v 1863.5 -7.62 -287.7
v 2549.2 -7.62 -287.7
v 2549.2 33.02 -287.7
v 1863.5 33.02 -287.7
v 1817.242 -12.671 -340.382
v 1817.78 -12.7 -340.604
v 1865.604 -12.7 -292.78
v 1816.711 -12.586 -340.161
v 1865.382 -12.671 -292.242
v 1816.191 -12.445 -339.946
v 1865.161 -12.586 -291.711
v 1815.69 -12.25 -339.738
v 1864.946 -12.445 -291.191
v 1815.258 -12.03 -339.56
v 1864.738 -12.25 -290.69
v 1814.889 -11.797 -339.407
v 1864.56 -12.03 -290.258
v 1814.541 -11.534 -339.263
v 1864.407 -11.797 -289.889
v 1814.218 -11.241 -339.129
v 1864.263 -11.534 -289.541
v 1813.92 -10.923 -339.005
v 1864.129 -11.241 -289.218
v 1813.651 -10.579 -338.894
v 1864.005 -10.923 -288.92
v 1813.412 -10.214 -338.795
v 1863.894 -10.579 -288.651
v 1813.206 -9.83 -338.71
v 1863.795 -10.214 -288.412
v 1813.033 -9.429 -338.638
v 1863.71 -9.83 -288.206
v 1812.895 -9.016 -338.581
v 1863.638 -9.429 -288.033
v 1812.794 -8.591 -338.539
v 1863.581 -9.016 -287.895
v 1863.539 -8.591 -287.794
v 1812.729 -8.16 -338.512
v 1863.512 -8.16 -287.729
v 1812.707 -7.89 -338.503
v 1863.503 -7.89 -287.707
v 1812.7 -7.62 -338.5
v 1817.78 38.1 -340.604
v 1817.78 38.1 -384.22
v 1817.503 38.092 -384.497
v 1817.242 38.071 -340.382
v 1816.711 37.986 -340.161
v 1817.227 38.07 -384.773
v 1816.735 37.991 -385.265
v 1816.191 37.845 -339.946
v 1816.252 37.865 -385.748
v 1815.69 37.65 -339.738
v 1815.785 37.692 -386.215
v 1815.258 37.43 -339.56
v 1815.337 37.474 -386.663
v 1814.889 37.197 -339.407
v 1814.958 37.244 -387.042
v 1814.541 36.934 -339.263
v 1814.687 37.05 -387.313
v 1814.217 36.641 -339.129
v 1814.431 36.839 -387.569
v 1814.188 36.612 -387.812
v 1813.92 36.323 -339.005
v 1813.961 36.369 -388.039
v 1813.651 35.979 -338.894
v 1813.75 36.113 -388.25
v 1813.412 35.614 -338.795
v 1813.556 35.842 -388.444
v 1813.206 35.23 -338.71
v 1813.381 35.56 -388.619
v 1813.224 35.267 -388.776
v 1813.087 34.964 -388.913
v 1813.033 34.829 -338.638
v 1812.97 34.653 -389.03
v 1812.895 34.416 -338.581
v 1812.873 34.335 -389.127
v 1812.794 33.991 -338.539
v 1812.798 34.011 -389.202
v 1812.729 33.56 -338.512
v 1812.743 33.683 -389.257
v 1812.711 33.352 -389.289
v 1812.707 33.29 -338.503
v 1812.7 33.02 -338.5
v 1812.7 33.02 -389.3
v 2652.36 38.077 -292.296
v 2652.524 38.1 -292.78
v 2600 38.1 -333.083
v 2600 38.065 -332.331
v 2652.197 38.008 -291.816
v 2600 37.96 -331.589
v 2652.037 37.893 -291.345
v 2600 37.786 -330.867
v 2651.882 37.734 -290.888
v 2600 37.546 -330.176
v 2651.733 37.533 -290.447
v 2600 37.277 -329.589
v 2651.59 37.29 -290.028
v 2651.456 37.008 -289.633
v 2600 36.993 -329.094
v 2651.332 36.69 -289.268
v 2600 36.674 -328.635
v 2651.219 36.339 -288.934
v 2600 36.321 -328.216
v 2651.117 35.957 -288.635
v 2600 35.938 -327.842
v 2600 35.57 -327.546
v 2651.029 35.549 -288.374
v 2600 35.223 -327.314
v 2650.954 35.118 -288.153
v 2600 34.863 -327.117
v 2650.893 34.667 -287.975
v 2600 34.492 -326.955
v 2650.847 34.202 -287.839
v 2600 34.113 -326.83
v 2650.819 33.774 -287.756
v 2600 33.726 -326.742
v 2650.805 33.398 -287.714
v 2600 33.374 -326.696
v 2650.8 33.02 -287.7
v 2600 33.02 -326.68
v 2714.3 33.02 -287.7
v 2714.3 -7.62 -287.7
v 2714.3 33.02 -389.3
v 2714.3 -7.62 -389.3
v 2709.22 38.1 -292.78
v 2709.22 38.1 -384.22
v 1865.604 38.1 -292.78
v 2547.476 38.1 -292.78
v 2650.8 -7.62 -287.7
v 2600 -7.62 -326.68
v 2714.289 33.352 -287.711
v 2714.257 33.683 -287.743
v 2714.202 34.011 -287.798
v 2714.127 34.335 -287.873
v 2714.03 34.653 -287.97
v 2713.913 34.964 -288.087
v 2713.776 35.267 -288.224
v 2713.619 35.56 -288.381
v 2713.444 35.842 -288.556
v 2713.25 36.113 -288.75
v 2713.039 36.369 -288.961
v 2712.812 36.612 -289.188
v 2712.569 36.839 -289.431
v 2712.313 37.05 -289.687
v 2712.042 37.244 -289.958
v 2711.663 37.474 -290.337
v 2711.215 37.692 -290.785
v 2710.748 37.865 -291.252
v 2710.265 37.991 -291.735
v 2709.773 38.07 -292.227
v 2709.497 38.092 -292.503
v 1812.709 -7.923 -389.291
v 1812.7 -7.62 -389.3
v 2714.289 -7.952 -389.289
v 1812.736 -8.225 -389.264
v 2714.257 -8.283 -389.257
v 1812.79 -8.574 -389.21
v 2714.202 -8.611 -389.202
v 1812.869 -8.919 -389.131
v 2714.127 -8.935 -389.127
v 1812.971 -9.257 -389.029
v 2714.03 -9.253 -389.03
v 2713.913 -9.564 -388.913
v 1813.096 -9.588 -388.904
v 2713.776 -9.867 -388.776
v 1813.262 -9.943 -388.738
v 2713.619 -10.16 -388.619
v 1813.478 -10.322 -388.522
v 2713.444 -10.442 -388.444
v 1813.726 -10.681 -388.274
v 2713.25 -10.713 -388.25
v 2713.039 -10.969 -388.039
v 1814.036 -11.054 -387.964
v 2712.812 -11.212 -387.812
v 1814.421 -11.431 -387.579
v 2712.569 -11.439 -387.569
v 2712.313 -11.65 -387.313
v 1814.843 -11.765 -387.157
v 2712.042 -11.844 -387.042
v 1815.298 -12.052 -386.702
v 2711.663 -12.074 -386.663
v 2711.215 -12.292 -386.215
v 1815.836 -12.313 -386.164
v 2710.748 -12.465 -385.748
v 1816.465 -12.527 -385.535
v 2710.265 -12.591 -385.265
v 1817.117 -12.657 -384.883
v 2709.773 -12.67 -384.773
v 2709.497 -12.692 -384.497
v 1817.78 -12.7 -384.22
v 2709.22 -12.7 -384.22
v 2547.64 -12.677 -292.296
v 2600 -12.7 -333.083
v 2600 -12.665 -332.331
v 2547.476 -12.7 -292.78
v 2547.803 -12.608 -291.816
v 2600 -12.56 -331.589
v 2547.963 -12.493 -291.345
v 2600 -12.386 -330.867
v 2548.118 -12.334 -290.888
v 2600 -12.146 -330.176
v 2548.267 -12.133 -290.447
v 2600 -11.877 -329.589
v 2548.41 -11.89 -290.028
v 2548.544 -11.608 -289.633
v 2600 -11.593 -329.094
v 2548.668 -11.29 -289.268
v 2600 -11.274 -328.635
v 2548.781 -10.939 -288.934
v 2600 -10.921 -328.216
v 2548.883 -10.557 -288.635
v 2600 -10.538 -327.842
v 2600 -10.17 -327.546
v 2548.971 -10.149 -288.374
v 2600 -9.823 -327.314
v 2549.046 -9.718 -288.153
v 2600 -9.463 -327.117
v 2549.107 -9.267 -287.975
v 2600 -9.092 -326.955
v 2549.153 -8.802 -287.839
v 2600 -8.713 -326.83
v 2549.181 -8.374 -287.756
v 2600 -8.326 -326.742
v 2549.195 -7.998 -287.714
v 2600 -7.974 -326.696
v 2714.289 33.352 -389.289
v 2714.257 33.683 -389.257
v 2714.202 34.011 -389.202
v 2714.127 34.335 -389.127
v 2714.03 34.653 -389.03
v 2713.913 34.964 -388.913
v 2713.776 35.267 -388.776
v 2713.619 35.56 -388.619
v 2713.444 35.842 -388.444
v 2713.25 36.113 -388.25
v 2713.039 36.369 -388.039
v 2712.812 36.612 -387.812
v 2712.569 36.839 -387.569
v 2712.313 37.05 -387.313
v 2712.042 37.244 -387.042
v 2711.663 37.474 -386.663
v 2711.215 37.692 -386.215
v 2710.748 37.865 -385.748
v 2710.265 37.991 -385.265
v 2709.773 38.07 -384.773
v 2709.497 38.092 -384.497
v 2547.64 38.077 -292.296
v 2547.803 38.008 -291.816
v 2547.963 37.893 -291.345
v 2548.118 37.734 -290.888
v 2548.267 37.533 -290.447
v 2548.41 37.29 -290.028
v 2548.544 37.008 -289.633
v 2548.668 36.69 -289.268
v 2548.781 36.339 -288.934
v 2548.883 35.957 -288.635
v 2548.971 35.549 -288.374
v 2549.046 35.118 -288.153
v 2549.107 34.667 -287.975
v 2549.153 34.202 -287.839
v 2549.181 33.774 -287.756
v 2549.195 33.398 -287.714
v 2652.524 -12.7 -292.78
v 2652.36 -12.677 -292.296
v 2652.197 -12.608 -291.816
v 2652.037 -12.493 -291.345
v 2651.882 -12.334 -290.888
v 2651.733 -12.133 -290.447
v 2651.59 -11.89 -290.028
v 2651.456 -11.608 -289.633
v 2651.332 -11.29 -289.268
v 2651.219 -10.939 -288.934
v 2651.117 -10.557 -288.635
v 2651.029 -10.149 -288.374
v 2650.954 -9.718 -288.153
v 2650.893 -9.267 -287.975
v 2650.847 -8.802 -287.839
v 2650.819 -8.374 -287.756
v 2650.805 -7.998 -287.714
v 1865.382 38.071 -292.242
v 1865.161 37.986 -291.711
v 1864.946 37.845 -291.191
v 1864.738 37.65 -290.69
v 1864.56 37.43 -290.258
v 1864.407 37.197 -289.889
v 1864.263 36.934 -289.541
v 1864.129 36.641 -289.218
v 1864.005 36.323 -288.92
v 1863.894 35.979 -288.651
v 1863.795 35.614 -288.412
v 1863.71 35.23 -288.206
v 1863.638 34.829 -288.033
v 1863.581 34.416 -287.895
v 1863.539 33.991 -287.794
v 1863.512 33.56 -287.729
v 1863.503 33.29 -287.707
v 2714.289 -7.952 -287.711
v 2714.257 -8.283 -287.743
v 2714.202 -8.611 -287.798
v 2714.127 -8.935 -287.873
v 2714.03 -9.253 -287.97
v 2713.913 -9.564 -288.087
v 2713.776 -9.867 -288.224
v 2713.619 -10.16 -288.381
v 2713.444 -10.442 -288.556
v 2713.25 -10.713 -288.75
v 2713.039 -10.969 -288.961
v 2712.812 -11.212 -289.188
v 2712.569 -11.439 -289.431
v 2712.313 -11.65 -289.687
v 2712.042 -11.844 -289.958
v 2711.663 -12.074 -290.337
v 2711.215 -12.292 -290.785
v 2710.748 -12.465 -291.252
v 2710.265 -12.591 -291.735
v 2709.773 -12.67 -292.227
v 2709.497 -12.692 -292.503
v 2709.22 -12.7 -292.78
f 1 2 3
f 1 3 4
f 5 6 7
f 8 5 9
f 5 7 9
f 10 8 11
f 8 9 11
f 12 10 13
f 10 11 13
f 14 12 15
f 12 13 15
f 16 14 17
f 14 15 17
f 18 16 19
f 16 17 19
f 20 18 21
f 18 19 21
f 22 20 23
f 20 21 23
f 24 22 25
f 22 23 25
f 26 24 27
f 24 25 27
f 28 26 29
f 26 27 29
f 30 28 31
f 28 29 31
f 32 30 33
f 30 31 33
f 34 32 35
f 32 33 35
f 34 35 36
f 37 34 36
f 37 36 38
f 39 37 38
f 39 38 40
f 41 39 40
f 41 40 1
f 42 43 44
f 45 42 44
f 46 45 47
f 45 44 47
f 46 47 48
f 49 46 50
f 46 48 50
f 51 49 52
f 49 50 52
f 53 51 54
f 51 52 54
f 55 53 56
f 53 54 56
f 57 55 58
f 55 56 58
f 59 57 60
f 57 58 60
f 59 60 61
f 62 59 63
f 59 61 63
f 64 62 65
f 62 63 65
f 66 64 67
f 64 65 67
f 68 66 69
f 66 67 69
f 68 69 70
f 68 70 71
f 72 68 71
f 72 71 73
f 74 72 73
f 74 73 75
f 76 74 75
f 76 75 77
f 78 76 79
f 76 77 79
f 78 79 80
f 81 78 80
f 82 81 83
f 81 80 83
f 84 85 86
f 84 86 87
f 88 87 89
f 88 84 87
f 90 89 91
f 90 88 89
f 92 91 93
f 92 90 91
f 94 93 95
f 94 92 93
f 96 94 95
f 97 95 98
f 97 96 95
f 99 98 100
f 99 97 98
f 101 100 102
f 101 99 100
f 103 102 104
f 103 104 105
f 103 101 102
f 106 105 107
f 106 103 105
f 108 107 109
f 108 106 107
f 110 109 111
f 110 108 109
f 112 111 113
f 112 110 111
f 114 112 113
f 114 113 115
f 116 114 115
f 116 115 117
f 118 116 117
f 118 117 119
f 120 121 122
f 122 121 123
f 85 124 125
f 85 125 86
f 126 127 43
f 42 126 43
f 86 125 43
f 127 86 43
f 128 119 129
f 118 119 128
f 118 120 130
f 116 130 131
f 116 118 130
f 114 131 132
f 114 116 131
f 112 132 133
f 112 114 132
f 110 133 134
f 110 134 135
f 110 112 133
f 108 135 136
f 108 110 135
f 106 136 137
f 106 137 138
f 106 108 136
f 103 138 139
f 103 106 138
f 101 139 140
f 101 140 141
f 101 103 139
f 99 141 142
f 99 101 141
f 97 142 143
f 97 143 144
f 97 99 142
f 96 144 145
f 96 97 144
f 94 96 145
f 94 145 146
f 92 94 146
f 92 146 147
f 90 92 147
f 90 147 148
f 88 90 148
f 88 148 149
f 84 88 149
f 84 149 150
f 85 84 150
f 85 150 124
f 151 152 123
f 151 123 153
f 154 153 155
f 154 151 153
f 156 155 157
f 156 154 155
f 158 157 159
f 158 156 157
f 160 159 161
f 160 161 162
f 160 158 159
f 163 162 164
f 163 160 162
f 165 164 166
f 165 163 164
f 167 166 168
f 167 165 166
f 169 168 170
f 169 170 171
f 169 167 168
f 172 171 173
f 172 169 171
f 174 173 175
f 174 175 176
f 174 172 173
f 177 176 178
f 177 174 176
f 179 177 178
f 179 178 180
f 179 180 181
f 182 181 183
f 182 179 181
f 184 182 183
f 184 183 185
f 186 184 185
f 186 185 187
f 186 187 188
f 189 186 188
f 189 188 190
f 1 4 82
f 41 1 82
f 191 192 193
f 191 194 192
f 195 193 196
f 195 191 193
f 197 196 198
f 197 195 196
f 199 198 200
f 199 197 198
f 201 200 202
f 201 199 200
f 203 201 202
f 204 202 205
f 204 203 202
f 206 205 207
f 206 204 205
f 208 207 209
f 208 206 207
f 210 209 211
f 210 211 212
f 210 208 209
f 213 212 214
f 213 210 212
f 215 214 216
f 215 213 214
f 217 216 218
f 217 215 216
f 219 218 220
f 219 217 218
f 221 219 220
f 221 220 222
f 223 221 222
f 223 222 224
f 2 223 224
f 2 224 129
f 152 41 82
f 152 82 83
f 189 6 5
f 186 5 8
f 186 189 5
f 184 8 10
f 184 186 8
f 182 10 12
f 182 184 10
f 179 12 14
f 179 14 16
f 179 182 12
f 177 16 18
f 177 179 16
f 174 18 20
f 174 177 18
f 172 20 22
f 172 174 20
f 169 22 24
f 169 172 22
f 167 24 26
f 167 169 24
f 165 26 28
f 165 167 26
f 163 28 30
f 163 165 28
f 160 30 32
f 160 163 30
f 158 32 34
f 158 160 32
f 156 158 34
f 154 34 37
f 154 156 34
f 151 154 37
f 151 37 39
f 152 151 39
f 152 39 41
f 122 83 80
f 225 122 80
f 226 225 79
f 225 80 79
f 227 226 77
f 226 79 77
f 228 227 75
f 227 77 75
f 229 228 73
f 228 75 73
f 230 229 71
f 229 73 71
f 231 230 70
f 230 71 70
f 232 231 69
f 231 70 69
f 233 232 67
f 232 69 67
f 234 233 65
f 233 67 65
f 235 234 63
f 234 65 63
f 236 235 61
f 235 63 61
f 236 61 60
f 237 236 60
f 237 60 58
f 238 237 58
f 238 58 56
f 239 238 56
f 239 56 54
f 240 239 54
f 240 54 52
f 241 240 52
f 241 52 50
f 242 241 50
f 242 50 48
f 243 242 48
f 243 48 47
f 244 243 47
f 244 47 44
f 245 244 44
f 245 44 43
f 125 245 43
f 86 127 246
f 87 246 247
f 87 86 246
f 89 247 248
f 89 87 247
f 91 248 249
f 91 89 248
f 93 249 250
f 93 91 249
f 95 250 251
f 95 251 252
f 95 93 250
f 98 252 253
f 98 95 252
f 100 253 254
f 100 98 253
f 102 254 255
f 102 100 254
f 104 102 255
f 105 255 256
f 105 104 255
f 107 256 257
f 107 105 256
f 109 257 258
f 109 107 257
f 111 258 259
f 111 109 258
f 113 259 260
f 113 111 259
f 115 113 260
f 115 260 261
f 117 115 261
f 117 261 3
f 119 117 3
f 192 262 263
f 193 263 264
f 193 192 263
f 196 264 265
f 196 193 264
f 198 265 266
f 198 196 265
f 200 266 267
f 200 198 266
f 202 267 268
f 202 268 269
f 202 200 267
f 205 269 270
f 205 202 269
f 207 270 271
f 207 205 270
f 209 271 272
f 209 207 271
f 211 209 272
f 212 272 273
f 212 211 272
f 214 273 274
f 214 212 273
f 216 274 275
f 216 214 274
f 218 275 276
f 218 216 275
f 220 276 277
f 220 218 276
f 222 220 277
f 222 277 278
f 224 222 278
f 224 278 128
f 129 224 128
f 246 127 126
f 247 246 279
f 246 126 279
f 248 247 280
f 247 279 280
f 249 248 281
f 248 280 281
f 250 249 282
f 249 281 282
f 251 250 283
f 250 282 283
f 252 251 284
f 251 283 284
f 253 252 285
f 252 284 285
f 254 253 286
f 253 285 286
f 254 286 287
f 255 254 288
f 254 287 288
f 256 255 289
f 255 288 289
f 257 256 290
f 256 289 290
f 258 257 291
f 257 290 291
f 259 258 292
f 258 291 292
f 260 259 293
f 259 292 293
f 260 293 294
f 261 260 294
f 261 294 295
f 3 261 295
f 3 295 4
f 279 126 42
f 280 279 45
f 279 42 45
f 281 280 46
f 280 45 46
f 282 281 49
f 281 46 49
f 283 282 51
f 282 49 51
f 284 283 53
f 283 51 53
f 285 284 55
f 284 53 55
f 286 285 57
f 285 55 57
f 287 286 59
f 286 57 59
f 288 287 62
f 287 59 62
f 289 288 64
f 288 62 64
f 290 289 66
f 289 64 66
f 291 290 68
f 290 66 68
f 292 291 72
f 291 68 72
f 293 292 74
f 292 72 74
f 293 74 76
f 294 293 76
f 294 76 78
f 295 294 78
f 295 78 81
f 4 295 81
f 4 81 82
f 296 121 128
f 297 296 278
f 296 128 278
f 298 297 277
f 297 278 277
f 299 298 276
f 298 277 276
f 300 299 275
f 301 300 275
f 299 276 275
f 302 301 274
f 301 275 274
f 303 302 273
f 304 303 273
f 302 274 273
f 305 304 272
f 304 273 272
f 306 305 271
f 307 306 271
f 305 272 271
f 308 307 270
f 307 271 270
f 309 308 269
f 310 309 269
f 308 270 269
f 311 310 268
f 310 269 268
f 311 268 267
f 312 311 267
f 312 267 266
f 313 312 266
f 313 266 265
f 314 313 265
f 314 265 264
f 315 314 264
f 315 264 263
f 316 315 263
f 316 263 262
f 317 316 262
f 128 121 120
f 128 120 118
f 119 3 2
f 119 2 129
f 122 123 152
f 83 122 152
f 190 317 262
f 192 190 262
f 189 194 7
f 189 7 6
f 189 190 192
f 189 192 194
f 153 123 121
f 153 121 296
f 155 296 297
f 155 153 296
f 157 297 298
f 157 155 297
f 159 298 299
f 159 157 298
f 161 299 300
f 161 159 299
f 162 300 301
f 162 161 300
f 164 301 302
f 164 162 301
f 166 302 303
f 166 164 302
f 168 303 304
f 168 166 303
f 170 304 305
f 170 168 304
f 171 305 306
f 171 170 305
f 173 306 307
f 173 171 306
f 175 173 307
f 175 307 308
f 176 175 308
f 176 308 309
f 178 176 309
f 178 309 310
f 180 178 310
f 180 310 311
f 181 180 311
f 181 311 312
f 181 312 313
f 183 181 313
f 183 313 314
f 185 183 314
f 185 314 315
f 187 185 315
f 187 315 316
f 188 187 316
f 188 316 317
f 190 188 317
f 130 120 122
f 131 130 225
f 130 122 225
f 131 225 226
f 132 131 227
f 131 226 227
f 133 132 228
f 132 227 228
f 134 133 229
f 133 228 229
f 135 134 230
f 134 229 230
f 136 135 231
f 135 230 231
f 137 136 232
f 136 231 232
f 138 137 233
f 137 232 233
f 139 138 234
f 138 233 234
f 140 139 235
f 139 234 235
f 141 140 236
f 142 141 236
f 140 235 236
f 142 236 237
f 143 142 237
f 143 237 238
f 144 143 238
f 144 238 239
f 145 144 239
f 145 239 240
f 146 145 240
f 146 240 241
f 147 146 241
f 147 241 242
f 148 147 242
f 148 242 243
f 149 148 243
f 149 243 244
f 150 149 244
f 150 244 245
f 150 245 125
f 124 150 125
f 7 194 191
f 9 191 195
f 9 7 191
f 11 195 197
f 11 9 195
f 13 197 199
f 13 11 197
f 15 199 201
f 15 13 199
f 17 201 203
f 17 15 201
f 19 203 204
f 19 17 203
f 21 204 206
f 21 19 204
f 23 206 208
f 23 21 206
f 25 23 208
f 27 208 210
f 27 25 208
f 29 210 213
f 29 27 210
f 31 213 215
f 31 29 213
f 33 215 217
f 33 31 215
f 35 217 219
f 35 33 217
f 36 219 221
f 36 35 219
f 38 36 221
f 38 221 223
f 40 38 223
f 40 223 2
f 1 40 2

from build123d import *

# Parameters (mm, degrees)
SKETCH1_W           = 901.6
SKETCH1_H           = 101.6
BOSS_EXTRUDE1_DEPTH = 50.8
CUT_EXTRUDE1_DEPTH  = 51.8
FILLET1_R           = 5.08


with BuildPart() as part:
    # Sketch1 → Boss-Extrude1 (new body)
    with BuildSketch(Plane(origin=(0, -12.7, 0), x_dir=(-1, 0, 0), z_dir=(0, -1, 0))):
        with Locations((-2263.5, 338.5)):
            Rectangle(SKETCH1_W, SKETCH1_H)
    extrude(amount=-BOSS_EXTRUDE1_DEPTH)

    # Sketch3 → Cut-Extrude1 (cut, through all)
    with BuildSketch(Plane(origin=(0, 38.1, 0), x_dir=(1, 0, 0), z_dir=(0, 1, 0))):
        Polygon((2549.2, 287.7), (2600, 326.680210989), (2650.8, 287.7), align=None)
        Polygon((1812.7, 338.5), (1812.7, 287.7), (1863.5, 287.7), align=None)
    extrude(amount=-CUT_EXTRUDE1_DEPTH, mode=Mode.SUBTRACT)

    # Fillet1
    fillet1_edges = [part.edges().sort_by_distance(p)[0] for p in [
        (2206.35, -12.7, -287.7),
        (1812.7, -12.7, -363.9),
        (2263.5, 38.1, -389.3),
        (1812.7, 38.1, -363.9),
        (2206.35, 38.1, -287.7),
        (2574.6, -12.7, -307.190105495),
        (2625.4, -12.7, -307.190105495),
        (2625.4, 38.1, -307.190105495),
        (2574.6, 38.1, -307.190105495),
        (1838.1, -12.7, -313.1),
        (1838.1, 38.1, -313.1),
        (2714.3, 38.1, -338.5),
        (2263.5, -12.7, -389.3),
        (2682.55, -12.7, -287.7),
        (2714.3, -12.7, -338.5),
        (2682.55, 38.1, -287.7),
    ]]
    fillet(fillet1_edges, radius=FILLET1_R)


solid = part.part
